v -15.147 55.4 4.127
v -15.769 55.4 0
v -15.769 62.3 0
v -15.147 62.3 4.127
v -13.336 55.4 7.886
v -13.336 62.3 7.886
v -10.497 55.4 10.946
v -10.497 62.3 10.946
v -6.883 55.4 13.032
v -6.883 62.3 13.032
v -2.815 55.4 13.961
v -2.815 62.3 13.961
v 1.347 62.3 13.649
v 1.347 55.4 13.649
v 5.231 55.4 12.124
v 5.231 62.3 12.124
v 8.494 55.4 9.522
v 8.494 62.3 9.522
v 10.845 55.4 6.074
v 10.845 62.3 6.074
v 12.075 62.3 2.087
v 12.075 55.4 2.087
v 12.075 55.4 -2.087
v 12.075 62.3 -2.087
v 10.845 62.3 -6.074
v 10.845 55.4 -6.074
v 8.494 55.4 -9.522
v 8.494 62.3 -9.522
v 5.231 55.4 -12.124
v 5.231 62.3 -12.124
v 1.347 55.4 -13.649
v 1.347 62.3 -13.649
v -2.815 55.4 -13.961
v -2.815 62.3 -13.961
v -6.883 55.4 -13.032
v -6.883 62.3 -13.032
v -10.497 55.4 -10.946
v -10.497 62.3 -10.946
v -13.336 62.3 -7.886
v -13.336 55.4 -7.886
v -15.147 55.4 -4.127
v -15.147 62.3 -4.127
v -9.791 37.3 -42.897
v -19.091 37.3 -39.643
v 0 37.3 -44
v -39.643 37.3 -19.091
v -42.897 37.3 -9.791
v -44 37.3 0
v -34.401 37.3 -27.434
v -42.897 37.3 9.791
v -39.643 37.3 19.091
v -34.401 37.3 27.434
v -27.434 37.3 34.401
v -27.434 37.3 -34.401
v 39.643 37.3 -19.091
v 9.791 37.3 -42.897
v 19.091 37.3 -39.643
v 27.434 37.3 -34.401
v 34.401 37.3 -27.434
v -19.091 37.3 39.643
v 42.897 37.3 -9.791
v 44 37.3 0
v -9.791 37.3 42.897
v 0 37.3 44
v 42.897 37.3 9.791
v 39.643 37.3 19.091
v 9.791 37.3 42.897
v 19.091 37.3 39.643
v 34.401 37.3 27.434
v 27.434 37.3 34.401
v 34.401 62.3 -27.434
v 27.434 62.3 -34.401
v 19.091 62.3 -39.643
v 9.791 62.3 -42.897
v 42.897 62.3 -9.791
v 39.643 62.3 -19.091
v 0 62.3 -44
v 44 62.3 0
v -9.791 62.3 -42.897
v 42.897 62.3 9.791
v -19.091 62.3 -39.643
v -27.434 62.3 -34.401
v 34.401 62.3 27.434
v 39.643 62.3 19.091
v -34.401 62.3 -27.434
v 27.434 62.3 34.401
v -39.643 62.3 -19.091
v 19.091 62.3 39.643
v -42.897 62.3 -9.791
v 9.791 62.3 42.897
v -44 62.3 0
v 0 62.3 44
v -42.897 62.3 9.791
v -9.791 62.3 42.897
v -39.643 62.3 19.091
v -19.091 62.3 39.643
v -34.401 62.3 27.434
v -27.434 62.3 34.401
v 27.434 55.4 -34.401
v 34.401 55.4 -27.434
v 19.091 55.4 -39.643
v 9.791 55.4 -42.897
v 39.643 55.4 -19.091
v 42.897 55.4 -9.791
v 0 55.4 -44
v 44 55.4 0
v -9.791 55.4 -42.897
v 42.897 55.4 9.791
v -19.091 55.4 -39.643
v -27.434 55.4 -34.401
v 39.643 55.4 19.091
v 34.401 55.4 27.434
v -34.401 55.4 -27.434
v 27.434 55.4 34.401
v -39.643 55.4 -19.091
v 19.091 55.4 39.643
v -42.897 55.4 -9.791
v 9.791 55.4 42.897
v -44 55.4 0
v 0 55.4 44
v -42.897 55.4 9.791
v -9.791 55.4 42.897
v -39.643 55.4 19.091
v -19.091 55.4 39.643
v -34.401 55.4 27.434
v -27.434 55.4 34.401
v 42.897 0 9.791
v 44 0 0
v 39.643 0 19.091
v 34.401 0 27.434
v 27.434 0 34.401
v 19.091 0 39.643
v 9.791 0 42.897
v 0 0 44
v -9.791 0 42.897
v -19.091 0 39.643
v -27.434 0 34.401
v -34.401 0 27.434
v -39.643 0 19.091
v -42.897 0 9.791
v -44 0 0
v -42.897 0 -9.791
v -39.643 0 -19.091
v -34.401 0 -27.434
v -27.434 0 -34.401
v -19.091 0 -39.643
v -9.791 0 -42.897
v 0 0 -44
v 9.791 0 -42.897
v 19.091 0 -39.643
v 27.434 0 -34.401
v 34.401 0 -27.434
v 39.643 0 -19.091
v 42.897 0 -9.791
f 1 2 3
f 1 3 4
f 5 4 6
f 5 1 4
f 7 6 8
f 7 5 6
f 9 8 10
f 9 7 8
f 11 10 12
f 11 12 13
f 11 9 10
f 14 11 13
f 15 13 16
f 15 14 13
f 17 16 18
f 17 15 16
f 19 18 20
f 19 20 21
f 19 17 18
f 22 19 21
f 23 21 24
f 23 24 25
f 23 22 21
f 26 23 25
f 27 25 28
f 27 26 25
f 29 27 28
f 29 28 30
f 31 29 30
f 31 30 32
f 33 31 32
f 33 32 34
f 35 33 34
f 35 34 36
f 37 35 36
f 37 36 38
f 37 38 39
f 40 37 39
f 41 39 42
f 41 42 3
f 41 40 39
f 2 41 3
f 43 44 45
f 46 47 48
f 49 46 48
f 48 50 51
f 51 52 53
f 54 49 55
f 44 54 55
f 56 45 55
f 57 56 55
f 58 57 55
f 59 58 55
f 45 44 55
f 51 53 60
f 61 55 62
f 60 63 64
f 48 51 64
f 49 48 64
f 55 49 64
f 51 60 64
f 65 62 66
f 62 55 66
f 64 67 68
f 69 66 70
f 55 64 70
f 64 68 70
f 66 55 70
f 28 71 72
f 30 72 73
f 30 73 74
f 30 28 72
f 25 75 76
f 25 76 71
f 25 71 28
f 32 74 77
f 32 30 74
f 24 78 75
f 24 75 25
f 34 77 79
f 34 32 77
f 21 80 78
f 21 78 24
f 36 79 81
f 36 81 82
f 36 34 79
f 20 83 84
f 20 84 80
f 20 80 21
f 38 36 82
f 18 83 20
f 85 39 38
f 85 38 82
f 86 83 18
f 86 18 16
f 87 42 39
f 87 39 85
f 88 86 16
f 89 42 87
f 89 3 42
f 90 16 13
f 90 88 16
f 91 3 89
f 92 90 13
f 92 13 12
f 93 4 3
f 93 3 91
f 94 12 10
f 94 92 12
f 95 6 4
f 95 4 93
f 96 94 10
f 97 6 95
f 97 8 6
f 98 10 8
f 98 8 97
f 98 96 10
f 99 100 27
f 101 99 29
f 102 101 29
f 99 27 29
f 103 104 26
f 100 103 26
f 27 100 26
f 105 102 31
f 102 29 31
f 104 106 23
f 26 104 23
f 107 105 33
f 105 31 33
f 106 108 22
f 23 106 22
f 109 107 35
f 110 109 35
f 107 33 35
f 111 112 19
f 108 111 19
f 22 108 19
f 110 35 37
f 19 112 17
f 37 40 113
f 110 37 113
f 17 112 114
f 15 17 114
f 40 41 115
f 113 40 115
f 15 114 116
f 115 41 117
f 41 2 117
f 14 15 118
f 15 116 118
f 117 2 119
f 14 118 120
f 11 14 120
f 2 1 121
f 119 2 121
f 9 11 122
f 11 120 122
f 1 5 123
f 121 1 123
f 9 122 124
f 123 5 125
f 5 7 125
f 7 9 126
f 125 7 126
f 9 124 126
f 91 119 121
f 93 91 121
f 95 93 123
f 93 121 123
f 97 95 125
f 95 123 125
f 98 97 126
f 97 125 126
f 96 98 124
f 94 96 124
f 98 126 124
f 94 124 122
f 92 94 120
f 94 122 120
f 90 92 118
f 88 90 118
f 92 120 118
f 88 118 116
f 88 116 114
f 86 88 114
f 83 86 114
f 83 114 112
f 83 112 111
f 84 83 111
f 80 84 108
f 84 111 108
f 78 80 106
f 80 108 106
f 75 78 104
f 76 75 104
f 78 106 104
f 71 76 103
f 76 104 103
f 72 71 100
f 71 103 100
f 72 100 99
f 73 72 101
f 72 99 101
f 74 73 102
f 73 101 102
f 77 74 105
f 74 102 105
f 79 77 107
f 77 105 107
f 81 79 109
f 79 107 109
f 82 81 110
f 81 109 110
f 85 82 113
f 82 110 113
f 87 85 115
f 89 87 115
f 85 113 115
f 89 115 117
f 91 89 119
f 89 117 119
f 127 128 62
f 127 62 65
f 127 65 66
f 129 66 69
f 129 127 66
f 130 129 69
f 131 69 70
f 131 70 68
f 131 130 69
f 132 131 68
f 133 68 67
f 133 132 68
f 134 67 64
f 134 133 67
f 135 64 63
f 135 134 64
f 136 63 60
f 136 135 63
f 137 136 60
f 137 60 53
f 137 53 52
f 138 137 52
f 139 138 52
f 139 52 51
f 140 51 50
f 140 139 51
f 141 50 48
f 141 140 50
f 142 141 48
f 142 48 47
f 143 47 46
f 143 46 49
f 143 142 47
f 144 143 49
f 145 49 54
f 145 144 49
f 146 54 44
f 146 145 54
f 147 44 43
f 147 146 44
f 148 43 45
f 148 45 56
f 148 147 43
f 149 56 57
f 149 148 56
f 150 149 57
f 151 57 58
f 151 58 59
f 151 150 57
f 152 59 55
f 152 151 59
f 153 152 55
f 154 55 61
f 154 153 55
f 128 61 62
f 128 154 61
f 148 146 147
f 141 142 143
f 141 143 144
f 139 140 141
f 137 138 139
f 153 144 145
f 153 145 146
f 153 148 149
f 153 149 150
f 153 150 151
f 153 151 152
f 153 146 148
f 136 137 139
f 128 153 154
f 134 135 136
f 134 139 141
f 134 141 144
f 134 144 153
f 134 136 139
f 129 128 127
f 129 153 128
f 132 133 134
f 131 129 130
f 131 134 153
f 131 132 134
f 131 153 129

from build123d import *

# Parameters (mm, degrees)
F0_R     = 44
F1_DEPTH = 37.3
F5_START = 18.1
F4_R     = 44
F4_R_2   = 14
F5_DEPTH = 6.9


# Not quite as in the source:
# - the program builds the solid bodies; features that only make, move or delete a surface that nothing else refers to are left out


with BuildPart() as f1:
    # F0 (on Front) → F1 (new body)
    with BuildSketch(Plane.XZ):
        Circle(F0_R)
    extrude(amount=-F1_DEPTH)


with BuildPart() as f5:
    # F4 (on face) → F5 (new body)
    with BuildSketch(Plane(origin=(0, 37.3, 0), x_dir=(-1, 0, 0), z_dir=(0, 1, 0)).offset(F5_START)):
        Circle(F4_R)
        with Locations((1.7685926287, 0)):
            Circle(F4_R_2, mode=Mode.SUBTRACT)
    extrude(amount=F5_DEPTH)


solid = Compound([f1.part, f5.part])
